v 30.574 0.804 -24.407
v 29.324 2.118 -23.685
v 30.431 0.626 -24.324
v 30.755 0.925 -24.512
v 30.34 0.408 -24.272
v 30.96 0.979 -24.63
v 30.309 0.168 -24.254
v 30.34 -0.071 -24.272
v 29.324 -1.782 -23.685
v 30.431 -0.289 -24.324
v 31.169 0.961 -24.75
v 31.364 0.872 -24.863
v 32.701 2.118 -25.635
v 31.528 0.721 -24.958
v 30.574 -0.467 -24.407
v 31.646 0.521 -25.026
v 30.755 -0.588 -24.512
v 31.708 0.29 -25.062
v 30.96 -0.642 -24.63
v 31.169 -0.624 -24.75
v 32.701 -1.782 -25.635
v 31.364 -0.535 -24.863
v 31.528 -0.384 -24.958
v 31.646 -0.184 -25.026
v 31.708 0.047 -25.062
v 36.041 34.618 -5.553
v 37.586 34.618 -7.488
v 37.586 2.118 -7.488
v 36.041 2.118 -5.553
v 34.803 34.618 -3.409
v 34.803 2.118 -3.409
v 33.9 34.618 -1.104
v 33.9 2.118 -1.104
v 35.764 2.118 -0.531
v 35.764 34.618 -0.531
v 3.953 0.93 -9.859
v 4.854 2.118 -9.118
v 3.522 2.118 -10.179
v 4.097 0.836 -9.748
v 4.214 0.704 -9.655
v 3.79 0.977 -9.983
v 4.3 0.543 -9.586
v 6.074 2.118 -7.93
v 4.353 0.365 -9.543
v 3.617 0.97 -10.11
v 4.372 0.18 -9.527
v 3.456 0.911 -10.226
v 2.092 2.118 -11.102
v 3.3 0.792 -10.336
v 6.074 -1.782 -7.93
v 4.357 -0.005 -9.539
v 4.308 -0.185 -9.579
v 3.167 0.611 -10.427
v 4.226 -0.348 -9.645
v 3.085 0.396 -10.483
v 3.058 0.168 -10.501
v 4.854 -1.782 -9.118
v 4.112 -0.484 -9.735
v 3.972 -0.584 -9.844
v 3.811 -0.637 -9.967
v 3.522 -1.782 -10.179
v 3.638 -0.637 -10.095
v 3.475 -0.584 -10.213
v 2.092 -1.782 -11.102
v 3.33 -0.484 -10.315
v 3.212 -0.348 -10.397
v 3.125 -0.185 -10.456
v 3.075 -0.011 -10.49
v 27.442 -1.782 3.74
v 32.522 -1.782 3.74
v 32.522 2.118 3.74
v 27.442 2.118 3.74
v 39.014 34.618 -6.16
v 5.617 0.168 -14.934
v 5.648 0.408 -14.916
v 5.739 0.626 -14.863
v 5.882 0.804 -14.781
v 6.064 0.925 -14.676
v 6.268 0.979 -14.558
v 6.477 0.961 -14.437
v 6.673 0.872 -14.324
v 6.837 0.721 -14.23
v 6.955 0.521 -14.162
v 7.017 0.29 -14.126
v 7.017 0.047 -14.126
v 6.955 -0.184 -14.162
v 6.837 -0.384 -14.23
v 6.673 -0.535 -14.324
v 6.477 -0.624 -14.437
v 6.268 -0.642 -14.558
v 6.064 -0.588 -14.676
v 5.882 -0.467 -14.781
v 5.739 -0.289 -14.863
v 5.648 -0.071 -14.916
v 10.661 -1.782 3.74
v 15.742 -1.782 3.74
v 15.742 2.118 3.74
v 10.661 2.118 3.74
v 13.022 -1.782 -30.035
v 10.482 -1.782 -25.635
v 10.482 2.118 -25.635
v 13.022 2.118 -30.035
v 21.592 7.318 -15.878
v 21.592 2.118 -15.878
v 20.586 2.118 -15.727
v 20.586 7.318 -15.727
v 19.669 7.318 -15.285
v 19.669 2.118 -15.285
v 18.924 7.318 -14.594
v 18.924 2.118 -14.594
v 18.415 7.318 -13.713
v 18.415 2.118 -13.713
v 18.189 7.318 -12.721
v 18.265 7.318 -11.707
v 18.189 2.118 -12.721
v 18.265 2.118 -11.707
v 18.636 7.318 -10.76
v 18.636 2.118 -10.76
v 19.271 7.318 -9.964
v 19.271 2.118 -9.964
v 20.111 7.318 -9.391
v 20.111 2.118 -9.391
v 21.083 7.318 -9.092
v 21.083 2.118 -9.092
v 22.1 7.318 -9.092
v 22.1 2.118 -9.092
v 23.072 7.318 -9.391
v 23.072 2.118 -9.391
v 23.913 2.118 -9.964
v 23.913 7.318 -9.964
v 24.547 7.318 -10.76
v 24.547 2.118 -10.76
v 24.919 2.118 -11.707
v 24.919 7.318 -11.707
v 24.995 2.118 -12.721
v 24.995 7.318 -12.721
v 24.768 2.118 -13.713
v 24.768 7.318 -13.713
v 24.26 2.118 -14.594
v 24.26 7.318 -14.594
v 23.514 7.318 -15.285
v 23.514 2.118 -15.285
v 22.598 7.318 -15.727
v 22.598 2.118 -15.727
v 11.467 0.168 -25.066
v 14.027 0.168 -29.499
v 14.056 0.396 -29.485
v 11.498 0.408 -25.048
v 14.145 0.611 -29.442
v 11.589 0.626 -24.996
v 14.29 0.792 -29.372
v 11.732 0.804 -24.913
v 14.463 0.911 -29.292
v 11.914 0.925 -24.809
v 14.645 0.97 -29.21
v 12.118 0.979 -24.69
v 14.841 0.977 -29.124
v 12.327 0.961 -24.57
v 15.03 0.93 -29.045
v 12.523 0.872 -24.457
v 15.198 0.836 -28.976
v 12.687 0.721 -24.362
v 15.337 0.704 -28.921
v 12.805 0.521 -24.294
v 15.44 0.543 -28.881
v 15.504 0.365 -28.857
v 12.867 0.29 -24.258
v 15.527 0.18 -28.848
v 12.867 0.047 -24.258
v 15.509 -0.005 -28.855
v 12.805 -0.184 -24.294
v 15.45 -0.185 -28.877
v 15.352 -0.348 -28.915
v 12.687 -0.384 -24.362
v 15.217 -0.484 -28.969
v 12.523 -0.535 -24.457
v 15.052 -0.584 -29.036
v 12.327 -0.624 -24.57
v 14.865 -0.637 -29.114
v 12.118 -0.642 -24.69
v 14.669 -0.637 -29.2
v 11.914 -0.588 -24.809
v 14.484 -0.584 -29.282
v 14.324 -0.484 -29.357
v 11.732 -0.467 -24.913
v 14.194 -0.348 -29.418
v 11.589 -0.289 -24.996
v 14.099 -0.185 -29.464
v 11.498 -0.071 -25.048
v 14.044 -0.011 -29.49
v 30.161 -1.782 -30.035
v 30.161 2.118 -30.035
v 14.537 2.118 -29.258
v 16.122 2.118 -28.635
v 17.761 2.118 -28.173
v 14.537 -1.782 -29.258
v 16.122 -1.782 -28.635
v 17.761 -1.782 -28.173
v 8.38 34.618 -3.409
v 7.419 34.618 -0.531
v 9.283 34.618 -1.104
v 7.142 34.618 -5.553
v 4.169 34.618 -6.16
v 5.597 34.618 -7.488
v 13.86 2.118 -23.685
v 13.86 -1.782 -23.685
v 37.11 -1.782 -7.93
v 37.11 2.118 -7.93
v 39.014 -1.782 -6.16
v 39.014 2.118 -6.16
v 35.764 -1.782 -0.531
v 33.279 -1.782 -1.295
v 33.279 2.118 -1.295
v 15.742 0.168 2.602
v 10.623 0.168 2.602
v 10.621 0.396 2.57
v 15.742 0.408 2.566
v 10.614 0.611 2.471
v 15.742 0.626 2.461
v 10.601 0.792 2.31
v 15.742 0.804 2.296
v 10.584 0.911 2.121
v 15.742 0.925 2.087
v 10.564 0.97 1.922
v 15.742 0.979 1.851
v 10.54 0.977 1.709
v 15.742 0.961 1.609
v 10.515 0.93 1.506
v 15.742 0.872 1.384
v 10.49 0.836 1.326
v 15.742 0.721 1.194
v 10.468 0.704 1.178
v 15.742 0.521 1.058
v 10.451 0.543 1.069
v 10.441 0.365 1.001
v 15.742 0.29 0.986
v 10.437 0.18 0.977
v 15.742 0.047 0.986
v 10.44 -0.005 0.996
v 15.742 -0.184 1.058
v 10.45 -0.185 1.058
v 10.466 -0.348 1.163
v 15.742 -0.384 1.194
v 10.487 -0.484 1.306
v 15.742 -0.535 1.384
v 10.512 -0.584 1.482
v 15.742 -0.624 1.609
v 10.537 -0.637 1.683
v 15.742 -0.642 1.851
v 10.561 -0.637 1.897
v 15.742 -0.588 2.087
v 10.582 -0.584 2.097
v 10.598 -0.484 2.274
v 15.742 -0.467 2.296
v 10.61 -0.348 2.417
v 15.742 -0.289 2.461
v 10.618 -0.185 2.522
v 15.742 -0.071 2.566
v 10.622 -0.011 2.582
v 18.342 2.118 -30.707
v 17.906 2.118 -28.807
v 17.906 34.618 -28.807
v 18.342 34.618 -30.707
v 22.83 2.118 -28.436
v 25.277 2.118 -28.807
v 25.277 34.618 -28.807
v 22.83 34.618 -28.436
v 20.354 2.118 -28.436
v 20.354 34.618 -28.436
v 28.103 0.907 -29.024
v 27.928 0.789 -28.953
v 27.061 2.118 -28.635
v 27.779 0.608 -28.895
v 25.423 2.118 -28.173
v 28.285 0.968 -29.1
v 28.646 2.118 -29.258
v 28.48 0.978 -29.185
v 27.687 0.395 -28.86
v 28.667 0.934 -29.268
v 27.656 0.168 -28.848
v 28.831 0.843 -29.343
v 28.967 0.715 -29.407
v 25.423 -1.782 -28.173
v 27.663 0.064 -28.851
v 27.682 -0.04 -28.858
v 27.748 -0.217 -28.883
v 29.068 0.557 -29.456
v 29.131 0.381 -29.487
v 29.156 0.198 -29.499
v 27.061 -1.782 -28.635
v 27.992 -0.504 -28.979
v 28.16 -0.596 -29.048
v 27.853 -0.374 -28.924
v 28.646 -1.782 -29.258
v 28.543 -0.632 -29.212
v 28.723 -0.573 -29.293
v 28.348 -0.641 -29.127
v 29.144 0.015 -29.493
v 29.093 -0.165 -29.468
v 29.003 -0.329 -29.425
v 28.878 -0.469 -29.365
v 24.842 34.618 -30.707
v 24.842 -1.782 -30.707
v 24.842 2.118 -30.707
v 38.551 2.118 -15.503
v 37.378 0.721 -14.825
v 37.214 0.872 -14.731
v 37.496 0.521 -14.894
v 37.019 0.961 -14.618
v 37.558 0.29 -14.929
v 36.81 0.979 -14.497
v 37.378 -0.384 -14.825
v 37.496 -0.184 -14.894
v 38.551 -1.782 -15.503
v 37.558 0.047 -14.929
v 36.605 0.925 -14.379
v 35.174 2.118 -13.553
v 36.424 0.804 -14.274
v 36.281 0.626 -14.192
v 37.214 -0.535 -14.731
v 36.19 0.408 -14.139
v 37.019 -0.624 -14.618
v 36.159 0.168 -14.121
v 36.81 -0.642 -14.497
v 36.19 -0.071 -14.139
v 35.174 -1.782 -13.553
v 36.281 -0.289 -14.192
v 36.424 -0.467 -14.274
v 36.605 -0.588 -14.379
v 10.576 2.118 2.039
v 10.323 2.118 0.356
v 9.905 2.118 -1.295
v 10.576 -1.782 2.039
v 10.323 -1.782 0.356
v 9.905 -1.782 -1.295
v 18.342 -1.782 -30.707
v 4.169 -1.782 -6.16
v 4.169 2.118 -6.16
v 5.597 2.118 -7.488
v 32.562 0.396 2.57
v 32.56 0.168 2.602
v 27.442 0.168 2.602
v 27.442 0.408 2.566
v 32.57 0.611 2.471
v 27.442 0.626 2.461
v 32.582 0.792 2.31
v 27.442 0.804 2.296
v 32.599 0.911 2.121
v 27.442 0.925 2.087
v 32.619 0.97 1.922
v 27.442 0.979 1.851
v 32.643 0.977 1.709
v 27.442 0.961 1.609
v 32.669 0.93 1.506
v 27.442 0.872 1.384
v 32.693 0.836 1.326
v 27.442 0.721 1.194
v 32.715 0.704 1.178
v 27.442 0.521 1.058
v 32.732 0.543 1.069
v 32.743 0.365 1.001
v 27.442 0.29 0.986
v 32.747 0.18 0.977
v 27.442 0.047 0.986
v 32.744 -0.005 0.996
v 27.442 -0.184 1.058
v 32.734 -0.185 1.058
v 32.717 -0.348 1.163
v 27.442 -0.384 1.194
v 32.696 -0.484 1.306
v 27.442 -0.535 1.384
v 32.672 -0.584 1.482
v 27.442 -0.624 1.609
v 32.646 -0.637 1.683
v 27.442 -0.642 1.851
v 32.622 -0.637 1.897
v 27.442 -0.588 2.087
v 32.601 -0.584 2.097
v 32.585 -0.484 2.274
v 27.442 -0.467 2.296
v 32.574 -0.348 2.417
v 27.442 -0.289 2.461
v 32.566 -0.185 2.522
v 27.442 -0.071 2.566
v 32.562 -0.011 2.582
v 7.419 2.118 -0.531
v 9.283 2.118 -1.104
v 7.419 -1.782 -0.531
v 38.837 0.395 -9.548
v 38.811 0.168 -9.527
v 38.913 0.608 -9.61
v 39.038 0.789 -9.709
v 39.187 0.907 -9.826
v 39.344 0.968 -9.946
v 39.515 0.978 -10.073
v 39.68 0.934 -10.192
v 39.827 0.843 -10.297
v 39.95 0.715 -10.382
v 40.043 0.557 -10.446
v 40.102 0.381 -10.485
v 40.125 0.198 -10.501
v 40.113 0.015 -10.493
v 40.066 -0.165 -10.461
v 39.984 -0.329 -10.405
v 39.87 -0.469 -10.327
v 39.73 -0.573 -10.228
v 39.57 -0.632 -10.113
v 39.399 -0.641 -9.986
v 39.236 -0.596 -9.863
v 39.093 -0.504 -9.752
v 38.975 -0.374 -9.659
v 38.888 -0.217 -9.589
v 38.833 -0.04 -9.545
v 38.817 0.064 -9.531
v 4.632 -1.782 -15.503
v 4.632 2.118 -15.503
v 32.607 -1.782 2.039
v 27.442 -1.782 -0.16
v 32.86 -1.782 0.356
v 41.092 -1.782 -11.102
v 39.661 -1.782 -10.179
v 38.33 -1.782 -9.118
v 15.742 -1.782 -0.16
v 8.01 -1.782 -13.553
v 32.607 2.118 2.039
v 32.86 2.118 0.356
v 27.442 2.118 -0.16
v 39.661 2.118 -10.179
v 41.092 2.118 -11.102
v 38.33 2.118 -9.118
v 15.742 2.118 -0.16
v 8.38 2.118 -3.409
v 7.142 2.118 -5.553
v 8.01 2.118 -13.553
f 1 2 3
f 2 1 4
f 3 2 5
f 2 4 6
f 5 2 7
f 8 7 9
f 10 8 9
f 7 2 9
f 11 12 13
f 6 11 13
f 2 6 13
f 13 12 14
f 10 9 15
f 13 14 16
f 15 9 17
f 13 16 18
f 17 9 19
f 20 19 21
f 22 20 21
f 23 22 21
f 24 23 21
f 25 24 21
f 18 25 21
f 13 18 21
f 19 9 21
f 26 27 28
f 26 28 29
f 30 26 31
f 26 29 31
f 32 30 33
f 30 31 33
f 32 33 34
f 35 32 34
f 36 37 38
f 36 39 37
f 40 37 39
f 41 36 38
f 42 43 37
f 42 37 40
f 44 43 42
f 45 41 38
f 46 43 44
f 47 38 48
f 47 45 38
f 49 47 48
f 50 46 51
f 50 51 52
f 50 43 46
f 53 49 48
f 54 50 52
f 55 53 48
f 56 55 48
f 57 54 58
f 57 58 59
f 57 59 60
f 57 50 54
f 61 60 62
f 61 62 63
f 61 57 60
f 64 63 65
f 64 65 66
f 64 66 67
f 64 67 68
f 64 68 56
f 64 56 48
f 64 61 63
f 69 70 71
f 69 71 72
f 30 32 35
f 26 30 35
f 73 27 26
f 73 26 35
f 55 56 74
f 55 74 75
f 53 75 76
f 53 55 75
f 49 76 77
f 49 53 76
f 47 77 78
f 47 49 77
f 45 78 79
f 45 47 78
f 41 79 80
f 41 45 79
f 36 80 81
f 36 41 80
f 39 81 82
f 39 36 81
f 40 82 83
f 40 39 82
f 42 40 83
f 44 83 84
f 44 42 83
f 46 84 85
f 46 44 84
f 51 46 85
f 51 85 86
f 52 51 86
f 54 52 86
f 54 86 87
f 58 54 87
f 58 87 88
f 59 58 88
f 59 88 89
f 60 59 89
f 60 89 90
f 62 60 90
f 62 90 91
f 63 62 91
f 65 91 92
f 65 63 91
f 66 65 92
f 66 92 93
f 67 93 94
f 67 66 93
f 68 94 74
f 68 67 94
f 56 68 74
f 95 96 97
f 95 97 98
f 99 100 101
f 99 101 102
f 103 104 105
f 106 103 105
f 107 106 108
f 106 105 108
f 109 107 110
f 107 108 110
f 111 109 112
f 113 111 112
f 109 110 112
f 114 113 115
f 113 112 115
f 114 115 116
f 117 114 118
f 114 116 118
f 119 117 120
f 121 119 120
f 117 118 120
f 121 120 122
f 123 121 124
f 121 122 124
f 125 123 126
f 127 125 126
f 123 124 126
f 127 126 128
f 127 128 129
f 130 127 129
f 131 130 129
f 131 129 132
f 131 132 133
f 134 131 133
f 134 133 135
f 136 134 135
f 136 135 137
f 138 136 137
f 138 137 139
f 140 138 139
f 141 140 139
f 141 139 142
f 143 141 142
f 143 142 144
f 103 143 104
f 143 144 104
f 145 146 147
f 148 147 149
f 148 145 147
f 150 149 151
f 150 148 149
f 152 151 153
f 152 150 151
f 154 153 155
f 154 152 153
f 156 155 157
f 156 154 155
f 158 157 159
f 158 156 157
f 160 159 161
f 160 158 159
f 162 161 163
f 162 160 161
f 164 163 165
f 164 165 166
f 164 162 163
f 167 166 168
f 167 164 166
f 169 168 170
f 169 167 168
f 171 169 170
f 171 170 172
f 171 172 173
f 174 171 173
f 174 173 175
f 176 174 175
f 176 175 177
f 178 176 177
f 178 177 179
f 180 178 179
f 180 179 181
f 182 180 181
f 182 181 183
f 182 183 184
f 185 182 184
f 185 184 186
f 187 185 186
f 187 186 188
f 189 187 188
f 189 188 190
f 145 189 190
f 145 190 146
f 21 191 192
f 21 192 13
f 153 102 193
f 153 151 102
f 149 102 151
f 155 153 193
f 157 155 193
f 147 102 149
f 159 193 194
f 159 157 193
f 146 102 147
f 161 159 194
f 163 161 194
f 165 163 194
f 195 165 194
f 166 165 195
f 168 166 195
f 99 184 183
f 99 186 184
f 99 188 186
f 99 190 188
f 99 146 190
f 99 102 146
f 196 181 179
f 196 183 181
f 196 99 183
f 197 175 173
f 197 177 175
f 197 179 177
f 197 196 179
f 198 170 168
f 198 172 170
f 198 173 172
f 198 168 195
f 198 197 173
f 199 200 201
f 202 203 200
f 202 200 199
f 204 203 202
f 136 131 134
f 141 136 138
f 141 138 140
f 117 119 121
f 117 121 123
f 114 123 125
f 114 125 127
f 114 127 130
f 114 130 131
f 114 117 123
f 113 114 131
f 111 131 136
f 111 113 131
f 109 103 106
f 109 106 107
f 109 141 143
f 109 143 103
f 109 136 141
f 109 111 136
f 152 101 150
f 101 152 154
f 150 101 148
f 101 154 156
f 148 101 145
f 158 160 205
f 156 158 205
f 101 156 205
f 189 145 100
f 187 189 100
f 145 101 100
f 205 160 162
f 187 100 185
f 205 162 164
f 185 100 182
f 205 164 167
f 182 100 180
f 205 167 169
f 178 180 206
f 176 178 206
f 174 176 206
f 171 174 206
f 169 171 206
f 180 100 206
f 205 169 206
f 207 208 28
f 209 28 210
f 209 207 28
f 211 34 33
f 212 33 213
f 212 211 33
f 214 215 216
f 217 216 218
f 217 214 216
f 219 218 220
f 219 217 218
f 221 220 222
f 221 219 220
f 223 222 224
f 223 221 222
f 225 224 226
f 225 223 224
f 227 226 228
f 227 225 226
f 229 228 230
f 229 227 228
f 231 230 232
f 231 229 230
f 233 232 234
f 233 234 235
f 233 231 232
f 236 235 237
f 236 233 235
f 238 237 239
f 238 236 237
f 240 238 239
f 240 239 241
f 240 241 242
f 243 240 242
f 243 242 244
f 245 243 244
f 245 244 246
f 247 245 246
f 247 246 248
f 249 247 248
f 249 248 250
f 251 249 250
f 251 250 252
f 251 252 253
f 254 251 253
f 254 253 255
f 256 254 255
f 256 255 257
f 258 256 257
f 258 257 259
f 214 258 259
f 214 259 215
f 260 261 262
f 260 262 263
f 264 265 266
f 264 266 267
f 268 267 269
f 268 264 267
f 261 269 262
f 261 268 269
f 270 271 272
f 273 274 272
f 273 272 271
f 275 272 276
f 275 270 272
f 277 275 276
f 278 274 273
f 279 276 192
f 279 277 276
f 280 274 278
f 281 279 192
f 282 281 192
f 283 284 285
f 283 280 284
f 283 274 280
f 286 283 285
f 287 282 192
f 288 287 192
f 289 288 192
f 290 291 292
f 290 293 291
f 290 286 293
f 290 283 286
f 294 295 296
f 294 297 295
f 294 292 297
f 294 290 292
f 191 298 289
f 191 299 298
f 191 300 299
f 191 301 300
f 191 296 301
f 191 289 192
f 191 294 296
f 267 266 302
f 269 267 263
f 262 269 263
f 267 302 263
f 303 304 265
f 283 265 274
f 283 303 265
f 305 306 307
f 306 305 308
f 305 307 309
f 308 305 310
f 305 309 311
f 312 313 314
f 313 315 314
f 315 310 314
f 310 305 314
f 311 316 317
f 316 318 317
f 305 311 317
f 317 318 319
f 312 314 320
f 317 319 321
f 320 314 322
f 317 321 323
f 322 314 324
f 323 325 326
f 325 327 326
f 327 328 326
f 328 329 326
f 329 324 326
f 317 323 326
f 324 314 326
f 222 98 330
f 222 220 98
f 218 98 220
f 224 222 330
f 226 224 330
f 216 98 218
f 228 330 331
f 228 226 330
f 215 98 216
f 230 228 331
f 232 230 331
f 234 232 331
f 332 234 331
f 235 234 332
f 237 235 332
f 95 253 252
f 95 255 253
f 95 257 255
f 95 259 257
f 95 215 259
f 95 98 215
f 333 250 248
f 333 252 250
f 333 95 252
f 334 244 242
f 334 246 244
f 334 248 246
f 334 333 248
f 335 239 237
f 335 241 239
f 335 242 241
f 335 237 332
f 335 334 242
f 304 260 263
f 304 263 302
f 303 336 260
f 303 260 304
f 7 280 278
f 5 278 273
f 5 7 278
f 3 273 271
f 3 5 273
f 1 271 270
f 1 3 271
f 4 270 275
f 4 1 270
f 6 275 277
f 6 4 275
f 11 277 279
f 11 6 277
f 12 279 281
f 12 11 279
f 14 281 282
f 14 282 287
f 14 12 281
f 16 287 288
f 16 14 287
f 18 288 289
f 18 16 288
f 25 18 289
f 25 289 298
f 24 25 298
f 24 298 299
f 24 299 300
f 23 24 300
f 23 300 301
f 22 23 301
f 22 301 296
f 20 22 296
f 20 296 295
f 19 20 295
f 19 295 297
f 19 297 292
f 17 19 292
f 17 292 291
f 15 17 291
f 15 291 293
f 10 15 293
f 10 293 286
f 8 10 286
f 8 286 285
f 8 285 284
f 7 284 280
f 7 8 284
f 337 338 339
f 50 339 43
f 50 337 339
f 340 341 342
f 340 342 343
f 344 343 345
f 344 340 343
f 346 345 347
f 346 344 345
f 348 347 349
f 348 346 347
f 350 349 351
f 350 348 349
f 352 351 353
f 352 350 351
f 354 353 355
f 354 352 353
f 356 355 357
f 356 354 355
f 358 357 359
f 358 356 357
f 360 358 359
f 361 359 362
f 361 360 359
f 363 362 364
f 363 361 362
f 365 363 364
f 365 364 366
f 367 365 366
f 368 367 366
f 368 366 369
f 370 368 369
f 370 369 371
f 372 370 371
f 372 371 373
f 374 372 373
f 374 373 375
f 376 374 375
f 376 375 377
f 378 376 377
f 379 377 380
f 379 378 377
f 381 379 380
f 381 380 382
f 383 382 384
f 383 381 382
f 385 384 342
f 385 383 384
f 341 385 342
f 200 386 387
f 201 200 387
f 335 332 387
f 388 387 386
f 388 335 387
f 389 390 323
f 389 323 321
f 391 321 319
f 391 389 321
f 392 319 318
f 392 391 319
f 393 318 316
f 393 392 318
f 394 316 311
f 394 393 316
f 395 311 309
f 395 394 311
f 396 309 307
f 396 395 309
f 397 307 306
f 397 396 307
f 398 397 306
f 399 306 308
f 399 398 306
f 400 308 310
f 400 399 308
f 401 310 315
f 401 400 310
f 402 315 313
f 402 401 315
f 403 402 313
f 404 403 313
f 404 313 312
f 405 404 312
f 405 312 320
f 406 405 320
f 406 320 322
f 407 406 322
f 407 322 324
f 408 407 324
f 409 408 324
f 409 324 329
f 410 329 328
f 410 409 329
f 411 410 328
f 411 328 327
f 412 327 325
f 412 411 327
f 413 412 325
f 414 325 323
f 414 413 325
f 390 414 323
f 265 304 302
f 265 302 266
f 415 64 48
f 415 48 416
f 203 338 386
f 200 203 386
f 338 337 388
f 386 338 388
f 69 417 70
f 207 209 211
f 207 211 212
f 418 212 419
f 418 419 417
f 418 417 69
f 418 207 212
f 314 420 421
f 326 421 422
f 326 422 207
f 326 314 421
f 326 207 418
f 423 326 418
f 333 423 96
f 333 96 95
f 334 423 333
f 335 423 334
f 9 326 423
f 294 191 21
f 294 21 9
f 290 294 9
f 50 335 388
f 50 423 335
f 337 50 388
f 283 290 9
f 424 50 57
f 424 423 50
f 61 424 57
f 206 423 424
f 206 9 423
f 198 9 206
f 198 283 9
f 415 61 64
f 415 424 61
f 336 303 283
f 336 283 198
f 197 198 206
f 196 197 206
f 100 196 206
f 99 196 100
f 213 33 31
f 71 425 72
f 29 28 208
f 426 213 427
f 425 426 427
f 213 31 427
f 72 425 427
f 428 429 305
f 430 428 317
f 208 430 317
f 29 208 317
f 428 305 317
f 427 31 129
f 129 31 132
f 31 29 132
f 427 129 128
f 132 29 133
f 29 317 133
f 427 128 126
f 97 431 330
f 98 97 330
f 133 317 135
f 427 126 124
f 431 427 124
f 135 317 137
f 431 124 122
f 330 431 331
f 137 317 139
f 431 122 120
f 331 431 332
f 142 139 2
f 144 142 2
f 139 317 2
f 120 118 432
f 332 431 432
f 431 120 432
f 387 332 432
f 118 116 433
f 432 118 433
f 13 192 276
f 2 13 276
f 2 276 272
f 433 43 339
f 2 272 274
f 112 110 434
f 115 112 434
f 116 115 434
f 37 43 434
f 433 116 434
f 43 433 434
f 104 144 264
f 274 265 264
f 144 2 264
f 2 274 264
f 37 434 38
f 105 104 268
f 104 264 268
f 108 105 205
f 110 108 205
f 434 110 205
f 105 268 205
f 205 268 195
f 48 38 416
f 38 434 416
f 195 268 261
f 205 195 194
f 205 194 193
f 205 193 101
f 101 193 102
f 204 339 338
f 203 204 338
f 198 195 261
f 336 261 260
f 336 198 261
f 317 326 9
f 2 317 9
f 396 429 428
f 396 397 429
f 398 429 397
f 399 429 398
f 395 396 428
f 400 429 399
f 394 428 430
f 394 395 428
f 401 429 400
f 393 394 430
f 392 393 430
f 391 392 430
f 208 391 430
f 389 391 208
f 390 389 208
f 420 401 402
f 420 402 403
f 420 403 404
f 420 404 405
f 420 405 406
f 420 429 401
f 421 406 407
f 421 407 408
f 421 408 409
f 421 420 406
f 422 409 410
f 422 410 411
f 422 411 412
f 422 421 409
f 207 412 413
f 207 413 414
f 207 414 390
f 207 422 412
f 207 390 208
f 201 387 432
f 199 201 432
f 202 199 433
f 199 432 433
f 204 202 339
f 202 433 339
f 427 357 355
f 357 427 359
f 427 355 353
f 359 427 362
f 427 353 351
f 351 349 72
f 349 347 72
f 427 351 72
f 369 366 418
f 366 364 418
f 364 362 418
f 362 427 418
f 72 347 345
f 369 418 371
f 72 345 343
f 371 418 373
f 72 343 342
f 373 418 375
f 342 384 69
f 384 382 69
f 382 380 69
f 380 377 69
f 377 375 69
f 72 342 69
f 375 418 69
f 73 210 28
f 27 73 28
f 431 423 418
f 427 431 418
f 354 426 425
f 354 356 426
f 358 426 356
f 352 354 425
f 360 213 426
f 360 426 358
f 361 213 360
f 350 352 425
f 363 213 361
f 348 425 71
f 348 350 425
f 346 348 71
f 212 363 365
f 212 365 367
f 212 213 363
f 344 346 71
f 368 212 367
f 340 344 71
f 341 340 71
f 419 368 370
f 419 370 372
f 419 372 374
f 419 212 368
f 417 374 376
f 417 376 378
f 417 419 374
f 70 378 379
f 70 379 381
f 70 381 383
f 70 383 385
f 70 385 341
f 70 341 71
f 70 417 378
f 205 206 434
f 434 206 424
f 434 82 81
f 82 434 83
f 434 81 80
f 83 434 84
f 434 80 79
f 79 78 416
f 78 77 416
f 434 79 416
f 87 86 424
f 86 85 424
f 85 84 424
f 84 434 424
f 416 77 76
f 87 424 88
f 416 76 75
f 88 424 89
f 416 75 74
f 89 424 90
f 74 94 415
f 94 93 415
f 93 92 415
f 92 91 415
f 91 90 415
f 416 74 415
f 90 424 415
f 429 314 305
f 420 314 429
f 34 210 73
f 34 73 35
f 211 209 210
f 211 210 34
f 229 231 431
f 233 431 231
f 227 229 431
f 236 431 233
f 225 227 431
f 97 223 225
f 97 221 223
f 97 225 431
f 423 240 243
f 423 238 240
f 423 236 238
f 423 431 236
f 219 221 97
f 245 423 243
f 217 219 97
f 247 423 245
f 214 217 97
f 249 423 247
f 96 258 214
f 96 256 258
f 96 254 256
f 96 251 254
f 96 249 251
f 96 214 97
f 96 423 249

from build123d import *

# Parameters (mm, degrees)
BOSS_EXTRUDE1_DEPTH     = 3
SKETCH2_R               = 2.625
BOSS_EXTRUDE2_DEPTH     = 4
SKETCH3_W               = 9
SKETCH3_H               = 3
CUT_EXTRUDE1_DEPTH      = 46.717380795
CUT_EXTRUDE2_DEPTH      = 47.391760164
CUT_EXTRUDE2_DEPTH_BACK = 47.391760164
SKETCH4_R               = 0.625
CUT_EXTRUDE3_DEPTH      = 33.475581638
CUT_EXTRUDE3_DEPTH_BACK = 33.475581638
SKETCH5_R               = 0.625
CUT_EXTRUDE4_DEPTH      = 34.635958629
CUT_EXTRUDE4_DEPTH_BACK = 34.635958629
SKETCH6_R               = 0.625
BOSS_EXTRUDE3_DEPTH     = 25
SCALE1_SCALE            = 1.3


with BuildPart() as part:
    # Sketch1 → Boss-Extrude1 (new body)
    with BuildSketch(Plane(origin=(0, 0, 0), x_dir=(1, 0, 0), z_dir=(0, 1, 0))):
        with BuildLine():
            Line((6.591682084, 11.417128277), (15, 25.980762114))
            ThreePointArc((15, 25.980762114), (16.768876635, 25.128389411), (18.644755802, 24.548267761))
            Line((18.644755802, 24.548267761), (19.091682084, 26.497692522))
            Line((19.091682084, 26.497692522), (24.091682084, 26.497692522))
            Line((24.091682084, 26.497692522), (24.538608366, 24.548267761))
            ThreePointArc((24.538608366, 24.548267761), (26.414487532, 25.128389411), (28.183364168, 25.980762114))
            Line((28.183364168, 25.980762114), (36.591682084, 11.417128277))
            ThreePointArc((36.591682084, 11.417128277), (34.969067352, 10.311422526), (33.528727683, 8.976924338))
            Line((33.528727683, 8.976924338), (34.993515908, 7.615162444))
            Line((34.993515908, 7.615162444), (32.493515908, 3.285035425))
            Line((32.493515908, 3.285035425), (30.581801401, 3.872698291))
            ThreePointArc((30.581801401, 3.872698291), (30.146261903, 1.958078454), (30, 0))
            Line((30, 0), (13.183364168, 0))
            ThreePointArc((13.183364168, 0), (13.037102264, 1.958078454), (12.601562767, 3.872698291))
            Line((12.601562767, 3.872698291), (10.68984826, 3.285035425))
            Line((10.68984826, 3.285035425), (8.18984826, 7.615162444))
            Line((8.18984826, 7.615162444), (9.654636485, 8.976924338))
            ThreePointArc((9.654636485, 8.976924338), (8.214296816, 10.311422526), (6.591682084, 11.417128277))
        make_face()
    extrude(amount=BOSS_EXTRUDE1_DEPTH)

    # Sketch2 → Boss-Extrude2 (add)
    with BuildSketch(Plane(origin=(0, 3, 0), x_dir=(1, 0, 0), z_dir=(0, 1, 0))):
        with Locations(Location((21.591682084, 12.465963463, 0), (0, 0, 90))):
            Circle(SKETCH2_R)
    extrude(amount=BOSS_EXTRUDE2_DEPTH)

    # Sketch3 → Cut-Extrude1 (cut, through all)
    with BuildSketch(Plane.XZ):
        with Locations((21.591682084, -1.5)):
            Rectangle(SKETCH3_W, SKETCH3_H)
        Polygon((8.545841042, -14.801830878), (13.045841042, -22.596059512), (15.643917253, -21.096059512), (11.143917253, -13.301830878), align=None)
        Polygon((34.637523126, -14.801830878), (32.039446914, -13.301830878), (27.539446914, -21.096059512), (30.137523126, -22.596059512), align=None)
    extrude(amount=-CUT_EXTRUDE1_DEPTH, mode=Mode.SUBTRACT)

    # Sketch4 → Cut-Extrude2 (cut, two sides: drawn at the far end of the back side and taken through both)
    with BuildSketch(Plane(origin=(2.25, 0, 3.897114317), x_dir=(-0.8660254037844389, 0, 0.4999999999999997), z_dir=(-0.4999999999999997, 0, -0.8660254037844389)).offset(-CUT_EXTRUDE2_DEPTH_BACK)):
        with Locations((-35.89789039, 1.5)):
            Circle(SKETCH4_R)
    extrude(amount=CUT_EXTRUDE2_DEPTH + CUT_EXTRUDE2_DEPTH_BACK, mode=Mode.SUBTRACT)

    # Sketch5 → Cut-Extrude3 (cut, two sides: drawn at the far end of the back side and taken through both)
    with BuildSketch(Plane(origin=(8.545841042, 0, -14.801830878), x_dir=(-0.8660254037844383, 0, -0.5000000000000008), z_dir=(0.5000000000000007, 0, -0.8660254037844382)).offset(-CUT_EXTRUDE3_DEPTH_BACK)):
        with Locations((-1.5, 1.5)):
            Circle(SKETCH5_R)
    extrude(amount=CUT_EXTRUDE3_DEPTH + CUT_EXTRUDE3_DEPTH_BACK, mode=Mode.SUBTRACT)

    # Sketch6 → Cut-Extrude4 (cut, two sides: drawn at the far end of the back side and taken through both)
    with BuildSketch(Plane.ZY.offset(-26.091682084).offset(-CUT_EXTRUDE4_DEPTH_BACK)):
        with Locations((-1.5, 1.5)):
            Circle(SKETCH6_R)
    extrude(amount=CUT_EXTRUDE4_DEPTH + CUT_EXTRUDE4_DEPTH_BACK, mode=Mode.SUBTRACT)

    # Sketch7 → Boss-Extrude3 (add)
    with BuildSketch(Plane(origin=(0, 3, 0), x_dir=(1, 0, 0), z_dir=(0, 1, 0))):
        with BuildLine():
            Line((8.18984826, 7.615162444), (10.68984826, 3.285035425))
            Line((10.68984826, 3.285035425), (12.12363414, 3.725782575))
            ThreePointArc((12.12363414, 3.725782575), (10.983890093, 6.341551902), (9.288439429, 8.636483864))
            Line((9.288439429, 8.636483864), (8.18984826, 7.615162444))
        make_face()
        with BuildLine():
            Line((32.493515908, 3.285035425), (34.993515908, 7.615162444))
            Line((34.993515908, 7.615162444), (33.894924739, 8.636483864))
            ThreePointArc((33.894924739, 8.636483864), (32.199474075, 6.341551902), (31.059730028, 3.725782575))
            Line((31.059730028, 3.725782575), (32.493515908, 3.285035425))
        make_face()
        with BuildLine():
            Line((19.091682084, 26.497692522), (24.091682084, 26.497692522))
            Line((24.091682084, 26.497692522), (24.426876795, 25.035623951))
            ThreePointArc((24.426876795, 25.035623951), (21.591682084, 24.714786587), (18.756487372, 25.035623951))
            Line((18.756487372, 25.035623951), (19.091682084, 26.497692522))
        make_face()
    extrude(amount=BOSS_EXTRUDE3_DEPTH)


with BuildPart() as part_1:
    # Scale1: scaled about (21.591676284, 5.938563321, -12.465985005)
    add(part.part.scale(SCALE1_SCALE).moved(Location((-6.477502885, -1.781568996, 3.739795502))))


solid = part_1.part
